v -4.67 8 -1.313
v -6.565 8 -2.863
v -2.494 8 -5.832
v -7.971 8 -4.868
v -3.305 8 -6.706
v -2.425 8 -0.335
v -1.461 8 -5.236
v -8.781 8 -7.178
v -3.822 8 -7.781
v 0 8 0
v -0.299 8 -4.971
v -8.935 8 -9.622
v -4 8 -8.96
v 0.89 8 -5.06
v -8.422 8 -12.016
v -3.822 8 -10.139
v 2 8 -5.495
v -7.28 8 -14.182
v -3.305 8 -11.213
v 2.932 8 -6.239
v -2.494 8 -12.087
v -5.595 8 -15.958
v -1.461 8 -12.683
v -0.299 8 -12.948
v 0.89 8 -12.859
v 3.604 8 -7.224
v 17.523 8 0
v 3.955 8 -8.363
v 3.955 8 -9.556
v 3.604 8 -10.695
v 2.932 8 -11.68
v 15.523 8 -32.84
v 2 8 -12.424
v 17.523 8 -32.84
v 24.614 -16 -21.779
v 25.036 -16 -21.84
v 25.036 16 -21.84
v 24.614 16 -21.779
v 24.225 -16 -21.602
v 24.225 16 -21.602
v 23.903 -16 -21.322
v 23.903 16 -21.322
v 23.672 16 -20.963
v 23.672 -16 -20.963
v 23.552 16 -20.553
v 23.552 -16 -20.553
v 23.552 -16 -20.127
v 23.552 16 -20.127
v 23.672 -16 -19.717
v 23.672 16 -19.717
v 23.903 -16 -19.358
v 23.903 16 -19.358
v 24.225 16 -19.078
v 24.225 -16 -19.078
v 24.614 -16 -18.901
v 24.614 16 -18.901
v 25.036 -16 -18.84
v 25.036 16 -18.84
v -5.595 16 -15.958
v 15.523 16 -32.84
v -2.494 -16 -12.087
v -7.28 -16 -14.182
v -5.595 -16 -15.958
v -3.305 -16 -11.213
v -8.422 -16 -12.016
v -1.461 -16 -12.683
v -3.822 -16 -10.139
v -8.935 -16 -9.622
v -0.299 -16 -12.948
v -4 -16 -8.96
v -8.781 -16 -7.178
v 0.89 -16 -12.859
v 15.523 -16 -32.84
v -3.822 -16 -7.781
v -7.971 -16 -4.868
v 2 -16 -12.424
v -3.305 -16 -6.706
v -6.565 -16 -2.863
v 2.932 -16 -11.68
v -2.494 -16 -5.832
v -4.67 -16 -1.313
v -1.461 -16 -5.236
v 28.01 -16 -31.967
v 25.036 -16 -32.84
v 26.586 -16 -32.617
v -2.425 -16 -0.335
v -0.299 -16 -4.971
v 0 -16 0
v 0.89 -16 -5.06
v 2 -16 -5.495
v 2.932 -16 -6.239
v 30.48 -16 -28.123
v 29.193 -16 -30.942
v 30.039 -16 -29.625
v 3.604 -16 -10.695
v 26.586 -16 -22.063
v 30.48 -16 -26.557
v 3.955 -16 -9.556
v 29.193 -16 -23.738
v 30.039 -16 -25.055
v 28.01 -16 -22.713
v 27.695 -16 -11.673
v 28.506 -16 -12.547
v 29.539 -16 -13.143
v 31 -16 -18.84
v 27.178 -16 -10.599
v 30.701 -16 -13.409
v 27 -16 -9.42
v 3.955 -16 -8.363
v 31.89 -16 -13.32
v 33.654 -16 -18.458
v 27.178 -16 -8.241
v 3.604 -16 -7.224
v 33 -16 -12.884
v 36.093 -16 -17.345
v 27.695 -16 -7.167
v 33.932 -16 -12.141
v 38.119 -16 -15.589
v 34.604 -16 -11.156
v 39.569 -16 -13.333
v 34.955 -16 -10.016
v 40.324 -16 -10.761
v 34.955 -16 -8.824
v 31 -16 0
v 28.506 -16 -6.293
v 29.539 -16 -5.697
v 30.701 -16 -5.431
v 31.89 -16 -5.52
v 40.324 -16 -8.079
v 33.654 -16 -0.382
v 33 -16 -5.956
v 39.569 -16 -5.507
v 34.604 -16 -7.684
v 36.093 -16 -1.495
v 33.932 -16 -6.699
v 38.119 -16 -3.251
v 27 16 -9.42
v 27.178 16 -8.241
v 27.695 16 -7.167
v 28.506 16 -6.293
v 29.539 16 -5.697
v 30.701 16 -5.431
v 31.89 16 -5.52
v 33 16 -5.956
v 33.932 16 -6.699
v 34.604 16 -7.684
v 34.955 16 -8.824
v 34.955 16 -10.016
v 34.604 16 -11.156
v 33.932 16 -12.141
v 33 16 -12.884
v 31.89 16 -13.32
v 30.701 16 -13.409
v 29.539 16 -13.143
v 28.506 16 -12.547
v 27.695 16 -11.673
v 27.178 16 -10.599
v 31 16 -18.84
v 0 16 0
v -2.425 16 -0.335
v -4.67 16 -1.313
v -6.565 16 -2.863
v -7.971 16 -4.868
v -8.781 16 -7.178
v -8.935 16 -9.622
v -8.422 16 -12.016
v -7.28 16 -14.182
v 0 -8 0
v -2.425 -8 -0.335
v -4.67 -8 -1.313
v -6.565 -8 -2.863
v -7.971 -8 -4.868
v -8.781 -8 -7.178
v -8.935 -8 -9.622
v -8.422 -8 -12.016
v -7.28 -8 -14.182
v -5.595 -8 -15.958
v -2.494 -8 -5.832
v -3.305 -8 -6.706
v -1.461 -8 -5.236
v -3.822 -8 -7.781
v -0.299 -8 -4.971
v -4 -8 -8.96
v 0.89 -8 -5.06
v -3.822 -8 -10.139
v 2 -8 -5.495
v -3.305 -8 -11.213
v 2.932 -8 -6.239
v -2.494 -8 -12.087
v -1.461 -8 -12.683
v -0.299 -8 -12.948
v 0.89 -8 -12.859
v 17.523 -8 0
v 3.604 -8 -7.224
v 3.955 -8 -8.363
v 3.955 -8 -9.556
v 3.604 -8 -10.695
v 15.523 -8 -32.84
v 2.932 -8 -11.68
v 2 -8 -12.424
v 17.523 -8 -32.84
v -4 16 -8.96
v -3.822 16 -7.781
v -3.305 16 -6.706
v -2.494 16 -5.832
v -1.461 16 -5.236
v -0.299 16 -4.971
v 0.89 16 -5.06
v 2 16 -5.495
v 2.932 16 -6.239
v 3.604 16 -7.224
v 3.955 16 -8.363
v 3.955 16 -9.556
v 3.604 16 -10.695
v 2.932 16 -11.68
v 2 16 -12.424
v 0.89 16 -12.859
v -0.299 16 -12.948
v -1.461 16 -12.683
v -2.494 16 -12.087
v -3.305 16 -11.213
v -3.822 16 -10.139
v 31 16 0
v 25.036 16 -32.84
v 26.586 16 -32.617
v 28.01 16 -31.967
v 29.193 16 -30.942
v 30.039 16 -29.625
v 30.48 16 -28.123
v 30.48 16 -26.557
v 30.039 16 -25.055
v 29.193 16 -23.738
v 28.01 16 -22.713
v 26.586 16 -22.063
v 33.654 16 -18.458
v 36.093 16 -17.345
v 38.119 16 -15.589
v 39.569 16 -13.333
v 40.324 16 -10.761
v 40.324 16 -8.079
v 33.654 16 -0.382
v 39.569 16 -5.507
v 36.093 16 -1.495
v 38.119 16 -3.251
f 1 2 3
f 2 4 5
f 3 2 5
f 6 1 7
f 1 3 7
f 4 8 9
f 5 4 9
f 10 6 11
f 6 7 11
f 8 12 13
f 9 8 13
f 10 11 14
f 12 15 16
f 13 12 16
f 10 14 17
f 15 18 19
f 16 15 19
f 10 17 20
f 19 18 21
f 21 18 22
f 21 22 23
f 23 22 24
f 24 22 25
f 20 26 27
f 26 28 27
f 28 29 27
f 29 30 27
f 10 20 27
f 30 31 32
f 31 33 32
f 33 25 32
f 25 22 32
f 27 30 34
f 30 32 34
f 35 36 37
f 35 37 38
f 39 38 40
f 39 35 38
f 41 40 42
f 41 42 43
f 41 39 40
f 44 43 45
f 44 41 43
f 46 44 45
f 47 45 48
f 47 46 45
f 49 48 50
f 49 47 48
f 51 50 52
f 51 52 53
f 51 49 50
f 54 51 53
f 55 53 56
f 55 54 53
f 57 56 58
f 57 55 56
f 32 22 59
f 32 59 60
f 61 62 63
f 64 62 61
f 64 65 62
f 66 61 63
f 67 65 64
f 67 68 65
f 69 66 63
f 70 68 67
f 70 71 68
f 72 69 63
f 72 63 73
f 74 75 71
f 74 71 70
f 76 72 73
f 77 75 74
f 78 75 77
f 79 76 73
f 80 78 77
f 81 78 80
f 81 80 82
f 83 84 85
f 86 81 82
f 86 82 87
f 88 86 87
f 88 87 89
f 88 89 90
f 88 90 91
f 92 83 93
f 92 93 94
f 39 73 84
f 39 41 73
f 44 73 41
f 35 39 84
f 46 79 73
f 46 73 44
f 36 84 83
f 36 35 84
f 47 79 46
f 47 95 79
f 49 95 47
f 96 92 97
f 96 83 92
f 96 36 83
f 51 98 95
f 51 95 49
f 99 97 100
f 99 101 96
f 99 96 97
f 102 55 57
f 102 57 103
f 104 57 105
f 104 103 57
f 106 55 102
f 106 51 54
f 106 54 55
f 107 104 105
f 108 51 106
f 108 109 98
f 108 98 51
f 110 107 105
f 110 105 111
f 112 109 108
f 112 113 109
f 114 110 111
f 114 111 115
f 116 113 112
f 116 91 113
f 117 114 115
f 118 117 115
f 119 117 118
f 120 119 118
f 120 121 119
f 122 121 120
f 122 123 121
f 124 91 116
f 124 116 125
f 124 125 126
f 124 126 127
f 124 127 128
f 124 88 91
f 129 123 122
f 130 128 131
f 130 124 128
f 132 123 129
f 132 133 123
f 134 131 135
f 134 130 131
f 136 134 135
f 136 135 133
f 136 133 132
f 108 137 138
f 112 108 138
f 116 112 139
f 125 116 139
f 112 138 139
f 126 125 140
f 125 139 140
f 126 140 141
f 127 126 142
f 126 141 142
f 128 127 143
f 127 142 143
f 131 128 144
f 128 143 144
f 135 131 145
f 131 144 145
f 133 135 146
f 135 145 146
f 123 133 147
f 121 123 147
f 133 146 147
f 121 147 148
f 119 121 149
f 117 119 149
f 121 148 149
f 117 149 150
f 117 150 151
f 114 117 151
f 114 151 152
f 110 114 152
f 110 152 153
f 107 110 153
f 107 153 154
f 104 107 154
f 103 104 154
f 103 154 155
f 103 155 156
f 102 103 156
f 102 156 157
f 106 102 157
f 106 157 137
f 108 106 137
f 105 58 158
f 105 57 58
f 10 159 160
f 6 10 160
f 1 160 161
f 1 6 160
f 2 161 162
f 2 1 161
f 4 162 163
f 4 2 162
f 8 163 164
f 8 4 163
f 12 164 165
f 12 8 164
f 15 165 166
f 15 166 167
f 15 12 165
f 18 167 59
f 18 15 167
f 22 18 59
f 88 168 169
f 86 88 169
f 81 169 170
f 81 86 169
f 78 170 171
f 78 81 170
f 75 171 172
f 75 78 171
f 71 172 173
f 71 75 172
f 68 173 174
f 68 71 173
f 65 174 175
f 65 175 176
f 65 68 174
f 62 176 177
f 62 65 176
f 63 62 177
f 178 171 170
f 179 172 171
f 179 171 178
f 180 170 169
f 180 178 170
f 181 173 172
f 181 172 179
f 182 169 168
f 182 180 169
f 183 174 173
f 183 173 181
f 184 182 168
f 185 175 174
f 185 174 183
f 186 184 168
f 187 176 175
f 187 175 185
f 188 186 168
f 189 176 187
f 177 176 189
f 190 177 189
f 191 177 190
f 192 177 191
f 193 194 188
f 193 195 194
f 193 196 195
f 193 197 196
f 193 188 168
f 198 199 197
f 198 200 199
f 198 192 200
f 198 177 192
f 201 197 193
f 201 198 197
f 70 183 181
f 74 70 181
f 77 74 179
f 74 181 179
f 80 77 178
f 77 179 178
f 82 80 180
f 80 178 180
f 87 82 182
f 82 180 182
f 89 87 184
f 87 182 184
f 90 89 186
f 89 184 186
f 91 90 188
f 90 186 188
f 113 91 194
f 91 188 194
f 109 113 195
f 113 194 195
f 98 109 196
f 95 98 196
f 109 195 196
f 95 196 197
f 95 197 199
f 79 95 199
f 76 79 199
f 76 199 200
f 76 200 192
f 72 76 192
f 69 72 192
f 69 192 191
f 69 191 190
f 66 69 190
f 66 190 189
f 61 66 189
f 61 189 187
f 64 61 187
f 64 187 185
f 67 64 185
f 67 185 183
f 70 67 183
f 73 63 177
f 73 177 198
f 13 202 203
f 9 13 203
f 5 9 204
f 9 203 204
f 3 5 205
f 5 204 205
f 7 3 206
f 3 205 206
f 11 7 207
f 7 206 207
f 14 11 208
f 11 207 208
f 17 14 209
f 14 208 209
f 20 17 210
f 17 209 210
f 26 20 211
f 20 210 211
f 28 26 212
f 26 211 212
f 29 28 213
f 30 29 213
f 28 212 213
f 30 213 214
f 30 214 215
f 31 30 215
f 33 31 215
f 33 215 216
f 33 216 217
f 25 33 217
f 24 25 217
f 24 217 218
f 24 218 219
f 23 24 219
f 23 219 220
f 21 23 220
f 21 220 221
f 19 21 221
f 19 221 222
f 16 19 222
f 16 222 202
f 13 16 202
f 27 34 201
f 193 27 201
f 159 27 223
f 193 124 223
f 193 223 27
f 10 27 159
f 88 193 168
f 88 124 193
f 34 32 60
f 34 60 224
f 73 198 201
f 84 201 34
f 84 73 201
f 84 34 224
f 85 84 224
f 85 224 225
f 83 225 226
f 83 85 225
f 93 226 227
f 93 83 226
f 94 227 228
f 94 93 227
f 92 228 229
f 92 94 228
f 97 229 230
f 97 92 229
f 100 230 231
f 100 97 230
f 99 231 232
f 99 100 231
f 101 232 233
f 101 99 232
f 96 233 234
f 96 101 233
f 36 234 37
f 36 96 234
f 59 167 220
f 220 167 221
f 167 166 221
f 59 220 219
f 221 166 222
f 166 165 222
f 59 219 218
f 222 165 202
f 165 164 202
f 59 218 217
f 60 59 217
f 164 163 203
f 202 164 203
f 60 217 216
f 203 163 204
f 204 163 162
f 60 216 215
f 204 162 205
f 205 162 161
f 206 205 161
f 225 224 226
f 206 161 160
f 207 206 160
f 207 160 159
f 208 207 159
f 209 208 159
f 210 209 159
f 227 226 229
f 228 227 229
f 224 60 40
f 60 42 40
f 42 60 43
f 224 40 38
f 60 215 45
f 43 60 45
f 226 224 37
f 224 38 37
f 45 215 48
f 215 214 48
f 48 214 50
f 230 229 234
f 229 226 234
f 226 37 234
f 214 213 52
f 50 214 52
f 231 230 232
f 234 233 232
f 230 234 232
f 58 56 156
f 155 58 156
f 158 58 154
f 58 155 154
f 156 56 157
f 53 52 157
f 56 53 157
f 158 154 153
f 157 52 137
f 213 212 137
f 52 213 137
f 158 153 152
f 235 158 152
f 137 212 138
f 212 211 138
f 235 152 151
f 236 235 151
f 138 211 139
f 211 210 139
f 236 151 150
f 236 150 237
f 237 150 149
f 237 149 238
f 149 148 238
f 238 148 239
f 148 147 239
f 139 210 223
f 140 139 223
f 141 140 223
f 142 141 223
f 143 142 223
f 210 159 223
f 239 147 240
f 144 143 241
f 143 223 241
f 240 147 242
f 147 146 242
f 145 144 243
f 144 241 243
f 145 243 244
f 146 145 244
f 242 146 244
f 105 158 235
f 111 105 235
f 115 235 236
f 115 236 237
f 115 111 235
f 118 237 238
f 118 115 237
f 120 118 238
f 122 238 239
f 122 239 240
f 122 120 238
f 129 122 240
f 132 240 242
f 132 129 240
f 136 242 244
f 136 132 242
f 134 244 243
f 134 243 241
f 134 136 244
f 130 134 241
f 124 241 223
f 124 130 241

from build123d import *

# Parameters (mm, degrees)
F1_DEPTH = 16
F2_W     = 26.482794
F2_H     = 16
F3_DEPTH = 32.841
F5_D     = 8


with BuildPart() as f1:
    # F0 (on Front) → F1 (new body, symmetric)
    with BuildSketch(Plane.XZ):
        with BuildLine():
            Line((31, 0), (0, 0))
            ThreePointArc((0, 0), (-8.455, -5.99534), (-5.594569, -15.957722))
            Line((-5.594569, -15.957722), (15.523241, -32.84))
            Line((15.523241, -32.84), (25.036241, -32.84))
            ThreePointArc((25.036241, -32.84), (30.536241, -27.34), (25.036241, -21.84))
            ThreePointArc((25.036241, -21.84), (23.536241, -20.34), (25.036241, -18.84))
            Line((25.036241, -18.84), (31, -18.84))
            ThreePointArc((31, -18.84), (40.42, -9.42), (31, 0))
        make_face()
    extrude(amount=F1_DEPTH, both=True)

    # F2 (on face) → F3 (cut, through all)
    with BuildSketch(Plane(origin=(0, 0, -32.84), x_dir=(1, 0, 0), z_dir=(0, 0, -1))):
        with Locations((4.281844, 0)):
            Rectangle(F2_W, F2_H)
    extrude(amount=-F3_DEPTH, mode=Mode.SUBTRACT)

    # F5 (through all)
    with Locations(Plane.XZ.offset(16)):
        with Locations((0, -8.959553), (31, -9.42)):
            Hole(F5_D / 2)


solid = f1.part
